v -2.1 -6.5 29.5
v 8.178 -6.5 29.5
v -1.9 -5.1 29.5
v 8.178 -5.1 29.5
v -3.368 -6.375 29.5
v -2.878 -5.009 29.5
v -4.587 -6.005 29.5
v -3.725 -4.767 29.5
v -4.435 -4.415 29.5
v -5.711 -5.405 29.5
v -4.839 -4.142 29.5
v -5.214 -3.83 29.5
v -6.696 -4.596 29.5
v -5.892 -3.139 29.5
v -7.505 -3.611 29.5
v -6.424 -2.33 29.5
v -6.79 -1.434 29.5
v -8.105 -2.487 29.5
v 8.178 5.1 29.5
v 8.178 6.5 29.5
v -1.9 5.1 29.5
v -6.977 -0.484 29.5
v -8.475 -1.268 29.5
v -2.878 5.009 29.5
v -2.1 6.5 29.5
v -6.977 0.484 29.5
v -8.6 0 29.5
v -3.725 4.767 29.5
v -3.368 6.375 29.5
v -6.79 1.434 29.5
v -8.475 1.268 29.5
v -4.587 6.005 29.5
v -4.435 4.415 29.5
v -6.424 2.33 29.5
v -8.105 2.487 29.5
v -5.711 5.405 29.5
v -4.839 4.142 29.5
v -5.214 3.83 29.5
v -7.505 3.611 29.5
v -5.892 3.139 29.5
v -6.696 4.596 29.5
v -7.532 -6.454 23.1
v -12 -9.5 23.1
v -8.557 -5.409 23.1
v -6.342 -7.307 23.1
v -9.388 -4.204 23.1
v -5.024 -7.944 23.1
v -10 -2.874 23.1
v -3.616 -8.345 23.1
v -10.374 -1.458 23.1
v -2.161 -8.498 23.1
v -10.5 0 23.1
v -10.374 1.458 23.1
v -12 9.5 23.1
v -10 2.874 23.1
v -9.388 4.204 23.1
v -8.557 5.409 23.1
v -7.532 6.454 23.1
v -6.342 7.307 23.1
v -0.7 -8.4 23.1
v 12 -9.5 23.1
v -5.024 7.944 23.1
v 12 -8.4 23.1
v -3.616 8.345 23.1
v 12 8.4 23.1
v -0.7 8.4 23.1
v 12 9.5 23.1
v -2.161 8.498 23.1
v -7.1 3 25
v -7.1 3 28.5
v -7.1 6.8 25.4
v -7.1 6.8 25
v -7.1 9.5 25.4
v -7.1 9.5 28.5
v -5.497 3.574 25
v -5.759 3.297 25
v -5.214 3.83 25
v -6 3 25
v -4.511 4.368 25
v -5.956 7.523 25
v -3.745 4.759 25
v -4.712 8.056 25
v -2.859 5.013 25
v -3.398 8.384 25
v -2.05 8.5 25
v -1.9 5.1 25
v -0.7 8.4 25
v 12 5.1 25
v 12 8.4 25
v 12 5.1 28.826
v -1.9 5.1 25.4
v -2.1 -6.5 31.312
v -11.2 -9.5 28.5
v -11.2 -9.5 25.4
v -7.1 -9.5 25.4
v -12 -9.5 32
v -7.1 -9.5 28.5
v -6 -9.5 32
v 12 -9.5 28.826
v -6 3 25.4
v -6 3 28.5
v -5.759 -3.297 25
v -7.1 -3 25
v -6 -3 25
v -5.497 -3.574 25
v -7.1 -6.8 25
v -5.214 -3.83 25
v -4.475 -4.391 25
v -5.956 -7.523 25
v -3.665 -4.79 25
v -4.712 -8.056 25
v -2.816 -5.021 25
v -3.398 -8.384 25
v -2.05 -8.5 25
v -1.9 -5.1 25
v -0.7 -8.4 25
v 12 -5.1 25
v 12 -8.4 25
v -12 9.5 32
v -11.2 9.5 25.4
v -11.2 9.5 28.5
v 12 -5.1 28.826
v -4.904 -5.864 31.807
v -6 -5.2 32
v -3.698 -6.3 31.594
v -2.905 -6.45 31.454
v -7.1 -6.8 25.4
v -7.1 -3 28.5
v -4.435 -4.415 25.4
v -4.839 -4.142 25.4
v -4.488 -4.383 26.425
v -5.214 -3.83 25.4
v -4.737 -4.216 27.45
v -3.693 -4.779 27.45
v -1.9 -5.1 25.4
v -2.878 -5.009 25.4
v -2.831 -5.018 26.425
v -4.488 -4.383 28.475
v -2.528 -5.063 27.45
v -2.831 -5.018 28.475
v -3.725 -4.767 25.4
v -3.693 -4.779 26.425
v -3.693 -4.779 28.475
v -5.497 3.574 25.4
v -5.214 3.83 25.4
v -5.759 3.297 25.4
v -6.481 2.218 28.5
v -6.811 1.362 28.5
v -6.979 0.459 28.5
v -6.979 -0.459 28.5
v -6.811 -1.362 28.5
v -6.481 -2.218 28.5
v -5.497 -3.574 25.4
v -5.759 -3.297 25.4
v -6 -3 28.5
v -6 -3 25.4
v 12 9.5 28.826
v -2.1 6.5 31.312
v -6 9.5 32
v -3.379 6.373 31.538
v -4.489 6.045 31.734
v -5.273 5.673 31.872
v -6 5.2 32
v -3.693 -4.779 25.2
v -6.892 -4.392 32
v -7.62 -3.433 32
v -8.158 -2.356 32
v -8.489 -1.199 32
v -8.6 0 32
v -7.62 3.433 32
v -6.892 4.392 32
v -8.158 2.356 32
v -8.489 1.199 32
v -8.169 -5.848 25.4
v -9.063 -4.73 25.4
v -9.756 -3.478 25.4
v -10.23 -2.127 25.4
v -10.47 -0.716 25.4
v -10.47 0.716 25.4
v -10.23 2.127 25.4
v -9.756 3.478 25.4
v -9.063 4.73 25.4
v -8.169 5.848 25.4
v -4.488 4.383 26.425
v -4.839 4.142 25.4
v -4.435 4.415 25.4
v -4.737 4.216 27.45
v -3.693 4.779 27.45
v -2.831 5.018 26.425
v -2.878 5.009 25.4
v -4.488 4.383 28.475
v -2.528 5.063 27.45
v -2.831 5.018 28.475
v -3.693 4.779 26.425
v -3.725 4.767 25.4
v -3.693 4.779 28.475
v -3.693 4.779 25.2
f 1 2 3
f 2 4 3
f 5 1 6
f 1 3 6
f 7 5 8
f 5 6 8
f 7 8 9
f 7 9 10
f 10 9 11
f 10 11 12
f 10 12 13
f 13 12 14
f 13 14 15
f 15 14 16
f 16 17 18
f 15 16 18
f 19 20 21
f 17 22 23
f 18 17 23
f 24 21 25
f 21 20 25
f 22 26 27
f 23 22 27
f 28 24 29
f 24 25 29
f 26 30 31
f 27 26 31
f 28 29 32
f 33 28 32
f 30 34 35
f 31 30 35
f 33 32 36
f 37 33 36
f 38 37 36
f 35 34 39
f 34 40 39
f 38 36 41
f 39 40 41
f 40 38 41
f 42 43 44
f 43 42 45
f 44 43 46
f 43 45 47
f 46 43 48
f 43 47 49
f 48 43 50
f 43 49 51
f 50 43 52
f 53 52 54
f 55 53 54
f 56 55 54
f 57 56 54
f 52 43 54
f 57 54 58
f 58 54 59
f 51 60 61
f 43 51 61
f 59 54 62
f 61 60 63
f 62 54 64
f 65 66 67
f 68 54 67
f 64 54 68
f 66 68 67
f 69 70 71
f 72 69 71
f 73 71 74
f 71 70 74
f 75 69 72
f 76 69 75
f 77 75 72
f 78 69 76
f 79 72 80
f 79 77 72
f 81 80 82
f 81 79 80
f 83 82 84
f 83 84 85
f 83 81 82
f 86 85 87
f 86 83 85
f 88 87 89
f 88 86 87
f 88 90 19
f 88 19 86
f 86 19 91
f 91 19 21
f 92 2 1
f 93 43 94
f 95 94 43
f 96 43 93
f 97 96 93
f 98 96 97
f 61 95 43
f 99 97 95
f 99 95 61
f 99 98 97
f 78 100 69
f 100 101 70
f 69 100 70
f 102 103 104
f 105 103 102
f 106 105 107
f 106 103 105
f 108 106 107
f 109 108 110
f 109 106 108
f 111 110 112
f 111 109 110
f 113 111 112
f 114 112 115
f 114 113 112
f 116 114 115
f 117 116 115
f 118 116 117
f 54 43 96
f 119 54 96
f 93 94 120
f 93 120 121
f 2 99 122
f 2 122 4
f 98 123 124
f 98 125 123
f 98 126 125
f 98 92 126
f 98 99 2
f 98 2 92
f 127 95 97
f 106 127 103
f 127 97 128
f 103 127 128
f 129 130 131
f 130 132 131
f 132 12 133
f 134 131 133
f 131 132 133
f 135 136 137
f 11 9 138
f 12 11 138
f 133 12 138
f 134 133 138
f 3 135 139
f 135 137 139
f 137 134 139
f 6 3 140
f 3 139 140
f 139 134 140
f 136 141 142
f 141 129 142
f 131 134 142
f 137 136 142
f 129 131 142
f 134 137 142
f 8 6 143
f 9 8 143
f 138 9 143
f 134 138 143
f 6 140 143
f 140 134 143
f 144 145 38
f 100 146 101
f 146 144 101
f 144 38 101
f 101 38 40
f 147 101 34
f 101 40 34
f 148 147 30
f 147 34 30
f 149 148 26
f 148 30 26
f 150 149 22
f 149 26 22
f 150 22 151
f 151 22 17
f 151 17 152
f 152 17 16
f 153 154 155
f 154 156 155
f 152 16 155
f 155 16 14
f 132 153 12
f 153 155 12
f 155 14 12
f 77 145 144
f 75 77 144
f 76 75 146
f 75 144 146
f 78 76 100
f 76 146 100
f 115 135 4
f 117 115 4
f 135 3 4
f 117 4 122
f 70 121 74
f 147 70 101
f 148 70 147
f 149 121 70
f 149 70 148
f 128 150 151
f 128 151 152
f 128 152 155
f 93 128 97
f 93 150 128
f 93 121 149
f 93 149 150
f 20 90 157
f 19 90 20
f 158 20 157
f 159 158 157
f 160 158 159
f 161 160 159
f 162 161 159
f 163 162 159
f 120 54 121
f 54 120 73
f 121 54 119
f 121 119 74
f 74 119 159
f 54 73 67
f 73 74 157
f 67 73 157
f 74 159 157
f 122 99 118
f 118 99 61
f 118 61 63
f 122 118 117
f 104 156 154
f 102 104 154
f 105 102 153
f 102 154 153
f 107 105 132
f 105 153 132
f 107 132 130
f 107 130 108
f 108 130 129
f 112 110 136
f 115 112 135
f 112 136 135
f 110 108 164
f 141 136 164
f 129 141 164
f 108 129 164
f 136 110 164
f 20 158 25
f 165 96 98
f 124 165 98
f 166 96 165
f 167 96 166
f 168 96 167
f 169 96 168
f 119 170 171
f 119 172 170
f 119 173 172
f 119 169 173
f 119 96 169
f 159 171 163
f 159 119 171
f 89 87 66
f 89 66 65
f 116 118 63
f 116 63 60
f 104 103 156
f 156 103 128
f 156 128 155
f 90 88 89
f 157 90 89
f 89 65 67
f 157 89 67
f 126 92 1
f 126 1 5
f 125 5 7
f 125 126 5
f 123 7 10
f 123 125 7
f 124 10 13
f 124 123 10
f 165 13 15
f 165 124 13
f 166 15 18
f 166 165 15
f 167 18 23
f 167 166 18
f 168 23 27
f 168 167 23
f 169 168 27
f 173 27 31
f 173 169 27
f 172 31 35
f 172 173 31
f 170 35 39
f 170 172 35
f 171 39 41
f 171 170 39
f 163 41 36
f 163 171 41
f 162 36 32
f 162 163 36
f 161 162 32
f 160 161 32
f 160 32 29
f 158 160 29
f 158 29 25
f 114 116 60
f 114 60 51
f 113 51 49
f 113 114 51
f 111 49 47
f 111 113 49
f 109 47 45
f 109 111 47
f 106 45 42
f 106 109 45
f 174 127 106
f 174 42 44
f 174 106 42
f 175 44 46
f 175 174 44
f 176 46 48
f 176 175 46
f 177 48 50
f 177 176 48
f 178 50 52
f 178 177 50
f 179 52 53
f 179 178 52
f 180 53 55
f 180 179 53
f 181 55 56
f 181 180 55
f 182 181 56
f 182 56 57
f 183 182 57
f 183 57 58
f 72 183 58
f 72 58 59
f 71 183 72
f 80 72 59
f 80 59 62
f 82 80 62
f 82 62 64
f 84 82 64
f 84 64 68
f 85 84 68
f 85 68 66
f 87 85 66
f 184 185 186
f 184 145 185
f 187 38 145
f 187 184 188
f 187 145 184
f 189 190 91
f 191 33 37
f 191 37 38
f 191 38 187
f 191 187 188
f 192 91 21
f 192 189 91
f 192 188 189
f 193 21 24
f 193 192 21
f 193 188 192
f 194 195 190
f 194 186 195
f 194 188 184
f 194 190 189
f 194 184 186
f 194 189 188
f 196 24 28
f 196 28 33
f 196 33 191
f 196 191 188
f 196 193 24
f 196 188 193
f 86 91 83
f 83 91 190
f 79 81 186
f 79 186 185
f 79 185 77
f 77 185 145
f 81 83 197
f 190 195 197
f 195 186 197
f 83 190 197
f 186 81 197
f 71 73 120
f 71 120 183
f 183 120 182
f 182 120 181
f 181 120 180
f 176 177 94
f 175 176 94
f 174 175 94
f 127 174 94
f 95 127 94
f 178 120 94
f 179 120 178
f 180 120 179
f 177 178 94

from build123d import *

# Parameters (mm, degrees)
SKETCH_1_24X19_W         = 19
SKETCH_1_24X19_H         = 24
EXTRUDE_1_33_DEPTH       = 33
CUT_EXTRUDE_2_REACH      = 38.377
CUT_EXTRUDE_4_2_DEPTH    = 1.9
CUT_EXTRUDE_6_3_REACH    = 29.71
SKETCH_7_5_W             = 24
SKETCH_7_5_H             = 19
EXTRUDE_7_DEPTH          = 5
CUT_EXTRUDE_10_4_REACH   = 41.925
SKETCH_11_W              = 8.5
SKETCH_11_H              = 3.1
CUT_EXTRUDE_11_5_DEPTH   = 4.9
SKETCH_11D1_W            = 6
SKETCH_11D1_H            = 3.1
CUT_EXTRUDE_11D1_6_DEPTH = 10
CUT_EXTRUDE_12_9_REACH   = 31.655
CUT_EXTRUDE_11_DEPTH     = 3.5
SKETCH_5903_W            = 53.98
SKETCH_5903_H            = 19
CUT_EXTRUDE_12_DEPTH     = 1
CUT_EXTRUDE_13_DEPTH     = 40.102429623
CUT_EXTRUDE_15_REACH     = 33.036
SKETCH_5021_R            = 3.5
EXTRUDE_2_DEPTH          = 0.4
SKETCH_7445_W            = 0.8
SKETCH_7445_H            = 3.1
EXTRUDE_3_DEPTH          = 19
CUT_EXTRUDE_16_DEPTH     = 32.036269144
SKETCH_14_W              = 54.018014823
SKETCH_14_H              = 29.926878018
CUT_EXTRUDE_17_DEPTH     = 28.710286942


with BuildPart() as part:
    # 1底部方形_24x19 → 1凸台-拉伸_高33 (new body)
    with BuildSketch(Plane(origin=(0, 0, 0), x_dir=(0, 1, 0), z_dir=(0, 0, 1))):
        Rectangle(SKETCH_1_24X19_W, SKETCH_1_24X19_H)
    extrude(amount=EXTRUDE_1_33_DEPTH)

    # 2吸嘴停靠渐变槽 → 2切除-拉伸 (cut, up to next)
    with BuildSketch(Plane.XY.offset(33), mode=Mode.PRIVATE) as cut_extrude_2_sk1:
        with BuildLine():
            Line((12, -5.1), (12, 5.1))
            Line((12, 5.1), (-1.9, 5.1))
            add(Edge.make_bspline(
                [(-5.213938048, 3.830222216), (-3.829124073, 5.093205317), (-1.9, 5.1)],
                knots=[0, 0, 0, 1, 1, 1], degree=2))
            ThreePointArc((-5.213938048, 3.830222216), (-7, 0), (-5.213938048, -3.830222216))
            add(Edge.make_bspline(
                [(-5.213938048, -3.830222216), (-3.829124073, -5.093205317), (-1.9, -5.1)],
                knots=[0, 0, 0, 1, 1, 1], degree=2))
            Line((-1.9, -5.1), (12, -5.1))
        make_face()
    cut_extrude_2_tool1 = extrude(cut_extrude_2_sk1.sketch, amount=-CUT_EXTRUDE_2_REACH, mode=Mode.PRIVATE) & part.part
    add(cut_extrude_2_tool1.solids().sort_by_distance((3.017719, 0, 33))[0], mode=Mode.SUBTRACT)

    # 4反光板停靠槽 → 4切除-拉伸2 (cut)
    with BuildSketch(Plane.XY.offset(25)):
        with BuildLine():
            Line((-0.7, 8.4), (12, 8.4))
            Line((12, 8.4), (12, -8.4))
            Line((12, -8.4), (-0.7, -8.4))
            ThreePointArc((-0.7, -8.4), (-10.5, 0), (-0.7, 8.4))
        make_face()
    extrude(amount=-CUT_EXTRUDE_4_2_DEPTH, mode=Mode.SUBTRACT)

    # 6反光板小圆柱 → 6切除-拉伸3 (cut, up to next)
    with BuildSketch(Plane.XY.offset(23.1), mode=Mode.PRIVATE) as cut_extrude_6_3_sk1:
        with BuildLine():
            Line((-2.1, -6.3), (12, -6.3))
            Line((12, -6.3), (12, 6.3))
            Line((12, 6.3), (-2.1, 6.3))
            ThreePointArc((-2.1, 6.3), (-8.4, 0), (-2.1, -6.3))
        make_face()
    cut_extrude_6_3_tool1 = extrude(cut_extrude_6_3_sk1.sketch, amount=-CUT_EXTRUDE_6_3_REACH, mode=Mode.PRIVATE) & part.part
    add(cut_extrude_6_3_tool1.solids().sort_by_distance((2.424095, 0, 23.1))[0], mode=Mode.SUBTRACT)

    # 7草图5 → 7凸台-拉伸_底板厚度 (add)
    with BuildSketch(Plane(origin=(0, 0, 0), x_dir=(1, 0, 0), z_dir=(0, 0, -1))):
        Rectangle(SKETCH_7_5_W, SKETCH_7_5_H)
    extrude(amount=-EXTRUDE_7_DEPTH)

    # 10切除-拉伸4: up to this face of the body (flat: up to its plane)
    cut_extrude_10_4_end = Plane(part.part.faces().sort_by_distance((0, -9.5, 16.5))[0])
    # Sketch 10 → 10切除-拉伸4 (cut, up to the picked face)
    with BuildSketch(Plane(origin=(0, 9.5, 0), x_dir=(-1, 0, 0), z_dir=(0, 1, 0)), mode=Mode.PRIVATE) as cut_extrude_10_4_sk1:
        Polygon((-12, 31.162738066), (-12, 33), (9, 33), align=None)
    cut_extrude_10_4_tool1 = split(extrude(cut_extrude_10_4_sk1.sketch, amount=-CUT_EXTRUDE_10_4_REACH, mode=Mode.PRIVATE), bisect_by=cut_extrude_10_4_end, keep=Keep.BOTH, mode=Mode.PRIVATE)
    add(cut_extrude_10_4_tool1.solids().sort_by(Axis((5, 9.5, 32.387579), (0, -1, 0)))[0], mode=Mode.SUBTRACT)

    # Sketch 11 → 11切除-拉伸5 (cut)
    with BuildSketch(Plane(origin=(-12, 0, 0), x_dir=(0, -1, 0), z_dir=(-1, 0, 0))):
        with Locations((-5.25, 26.95)):
            Rectangle(SKETCH_11_W, SKETCH_11_H)
        with Locations((5.25, 26.95)):
            Rectangle(SKETCH_11_W, SKETCH_11_H)
    extrude(amount=-CUT_EXTRUDE_11_5_DEPTH, mode=Mode.SUBTRACT)

    # 11d1_磁铁开窗 → 11d1切除-拉伸6 (cut)
    with BuildSketch(Plane(origin=(-12, 0, 0), x_dir=(0, -1, 0), z_dir=(-1, 0, 0))):
        with Locations((0, 26.95)):
            Rectangle(SKETCH_11D1_W, SKETCH_11D1_H)
    extrude(amount=-CUT_EXTRUDE_11D1_6_DEPTH, mode=Mode.SUBTRACT)

    # 12切除薄壁 → 12切除-拉伸9 (cut, up to next)
    with BuildSketch(Plane.XY.offset(25.4), mode=Mode.PRIVATE) as cut_extrude_12_9_sk1:
        with BuildLine():
            Line((-0.7, 8.4), (-0.7, -8.4))
            ThreePointArc((-0.7, -8.4), (-10.5, 0), (-0.7, 8.4))
        make_face()
    cut_extrude_12_9_tool1 = extrude(cut_extrude_12_9_sk1.sketch, amount=-CUT_EXTRUDE_12_9_REACH, mode=Mode.PRIVATE) & part.part
    add(cut_extrude_12_9_tool1.solids().sort_by_distance((-4.916056, 0, 25.4))[0], mode=Mode.SUBTRACT)

    # Sketch 5393 → 切除-拉伸11 (cut)
    with BuildSketch(Plane.XY.offset(33)):
        with BuildLine():
            Line((-2.099999748, 6.5), (12, 6.5))
            Line((12, 6.5), (12, -6.5))
            Line((12, -6.5), (-2.099999748, -6.5))
            ThreePointArc((-2.099999748, -6.5), (-8.6, 0), (-2.099999748, 6.5))
        make_face()
    extrude(amount=-CUT_EXTRUDE_11_DEPTH, mode=Mode.SUBTRACT)

    # Sketch 5903 → 切除-拉伸12 (cut)
    with BuildSketch(Plane.XY.offset(33)):
        with Locations((14.99, 0)):
            Rectangle(SKETCH_5903_W, SKETCH_5903_H)
    extrude(amount=-CUT_EXTRUDE_12_DEPTH, mode=Mode.SUBTRACT)

    # Sketch 6208 → 切除-拉伸13 (cut, through all)
    with BuildSketch(Plane.XZ.offset(9.5)):
        Polygon((2.430052303, 32), (12, 31.162738066), (12, 28.826114347), (-6, 32), align=None)
    extrude(amount=-CUT_EXTRUDE_13_DEPTH, mode=Mode.SUBTRACT)

    # Sketch 5021 → 切除-拉伸15 (cut, up to next)
    with BuildSketch(Plane.XY.offset(5), mode=Mode.PRIVATE) as cut_extrude_15_sk1:
        with Locations((2, 0)):
            Circle(SKETCH_5021_R)
    cut_extrude_15_tool1 = extrude(cut_extrude_15_sk1.sketch, amount=-CUT_EXTRUDE_15_REACH, mode=Mode.PRIVATE) & part.part
    add(cut_extrude_15_tool1.solids().sort_by_distance((2, 0, 5))[0], mode=Mode.SUBTRACT)

    # Sketch 6983 → 凸台-拉伸2 (add)
    with BuildSketch(Plane(origin=(0, 0, 25.4), x_dir=(1, 0, 0), z_dir=(0, 0, -1))):
        with BuildLine():
            Line((-7.1, -3), (-7.1, -6.8))
            ThreePointArc((-7.1, -6.8), (-4.061552813, -8.246211251), (-0.7, -8.4))
            Line((-0.7, -8.4), (-0.7, -5.1))
            Line((-0.7, -5.1), (-1.9, -5.1))
            add(Edge.make_bspline(
                [(-1.9, -5.1), (-3.829124073, -5.093205317), (-5.213938048, -3.830222216)],
                knots=[0, 0, 0, 1, 1, 1], degree=2))
            ThreePointArc((-5.213938048, -3.830222216), (-5.630777158, -3.437652866), (-6, -3))
            Line((-6, -3), (-7.1, -3))
        make_face()
        with BuildLine():
            Line((-7.1, 3), (-6, 3))
            ThreePointArc((-6, 3), (-5.630777158, 3.437652866), (-5.213938048, 3.830222216))
            add(Edge.make_bspline(
                [(-5.213938048, 3.830222216), (-3.829124073, 5.093205317), (-1.9, 5.1)],
                knots=[0, 0, 0, 1, 1, 1], degree=2))
            Line((-1.9, 5.1), (-0.7, 5.1))
            Line((-0.7, 5.1), (-0.7, 8.4))
            ThreePointArc((-0.7, 8.4), (-4.061552813, 8.246211251), (-7.1, 6.8))
            Line((-7.1, 6.8), (-7.1, 3))
        make_face()
    extrude(amount=EXTRUDE_2_DEPTH)

    # Sketch 7445 → 凸台-拉伸3 (add)
    with BuildSketch(Plane.XZ.offset(9.5)):
        with Locations((-11.6, 26.95)):
            Rectangle(SKETCH_7445_W, SKETCH_7445_H)
    extrude(amount=-EXTRUDE_3_DEPTH)

    # 草图13 → 切除-拉伸16 (cut, through all)
    with BuildSketch(Plane.XY.offset(5)):
        with BuildLine():
            Line((-2.1, -6.3), (12, -6.3))
            Line((12, -6.3), (12, 6.3))
            Line((12, 6.3), (-2.1, 6.3))
            ThreePointArc((-2.1, 6.3), (-8.4, 0), (-2.1, -6.3))
        make_face()
    extrude(amount=-CUT_EXTRUDE_16_DEPTH, mode=Mode.SUBTRACT)

    # 草图14 → 切除-拉伸17 (cut, through all)
    with BuildSketch(Plane.XY.offset(23.1)):
        with Locations((6.444750957, 0.291135192)):
            Rectangle(SKETCH_14_W, SKETCH_14_H)
    extrude(amount=-CUT_EXTRUDE_17_DEPTH, mode=Mode.SUBTRACT)


solid = part.part
